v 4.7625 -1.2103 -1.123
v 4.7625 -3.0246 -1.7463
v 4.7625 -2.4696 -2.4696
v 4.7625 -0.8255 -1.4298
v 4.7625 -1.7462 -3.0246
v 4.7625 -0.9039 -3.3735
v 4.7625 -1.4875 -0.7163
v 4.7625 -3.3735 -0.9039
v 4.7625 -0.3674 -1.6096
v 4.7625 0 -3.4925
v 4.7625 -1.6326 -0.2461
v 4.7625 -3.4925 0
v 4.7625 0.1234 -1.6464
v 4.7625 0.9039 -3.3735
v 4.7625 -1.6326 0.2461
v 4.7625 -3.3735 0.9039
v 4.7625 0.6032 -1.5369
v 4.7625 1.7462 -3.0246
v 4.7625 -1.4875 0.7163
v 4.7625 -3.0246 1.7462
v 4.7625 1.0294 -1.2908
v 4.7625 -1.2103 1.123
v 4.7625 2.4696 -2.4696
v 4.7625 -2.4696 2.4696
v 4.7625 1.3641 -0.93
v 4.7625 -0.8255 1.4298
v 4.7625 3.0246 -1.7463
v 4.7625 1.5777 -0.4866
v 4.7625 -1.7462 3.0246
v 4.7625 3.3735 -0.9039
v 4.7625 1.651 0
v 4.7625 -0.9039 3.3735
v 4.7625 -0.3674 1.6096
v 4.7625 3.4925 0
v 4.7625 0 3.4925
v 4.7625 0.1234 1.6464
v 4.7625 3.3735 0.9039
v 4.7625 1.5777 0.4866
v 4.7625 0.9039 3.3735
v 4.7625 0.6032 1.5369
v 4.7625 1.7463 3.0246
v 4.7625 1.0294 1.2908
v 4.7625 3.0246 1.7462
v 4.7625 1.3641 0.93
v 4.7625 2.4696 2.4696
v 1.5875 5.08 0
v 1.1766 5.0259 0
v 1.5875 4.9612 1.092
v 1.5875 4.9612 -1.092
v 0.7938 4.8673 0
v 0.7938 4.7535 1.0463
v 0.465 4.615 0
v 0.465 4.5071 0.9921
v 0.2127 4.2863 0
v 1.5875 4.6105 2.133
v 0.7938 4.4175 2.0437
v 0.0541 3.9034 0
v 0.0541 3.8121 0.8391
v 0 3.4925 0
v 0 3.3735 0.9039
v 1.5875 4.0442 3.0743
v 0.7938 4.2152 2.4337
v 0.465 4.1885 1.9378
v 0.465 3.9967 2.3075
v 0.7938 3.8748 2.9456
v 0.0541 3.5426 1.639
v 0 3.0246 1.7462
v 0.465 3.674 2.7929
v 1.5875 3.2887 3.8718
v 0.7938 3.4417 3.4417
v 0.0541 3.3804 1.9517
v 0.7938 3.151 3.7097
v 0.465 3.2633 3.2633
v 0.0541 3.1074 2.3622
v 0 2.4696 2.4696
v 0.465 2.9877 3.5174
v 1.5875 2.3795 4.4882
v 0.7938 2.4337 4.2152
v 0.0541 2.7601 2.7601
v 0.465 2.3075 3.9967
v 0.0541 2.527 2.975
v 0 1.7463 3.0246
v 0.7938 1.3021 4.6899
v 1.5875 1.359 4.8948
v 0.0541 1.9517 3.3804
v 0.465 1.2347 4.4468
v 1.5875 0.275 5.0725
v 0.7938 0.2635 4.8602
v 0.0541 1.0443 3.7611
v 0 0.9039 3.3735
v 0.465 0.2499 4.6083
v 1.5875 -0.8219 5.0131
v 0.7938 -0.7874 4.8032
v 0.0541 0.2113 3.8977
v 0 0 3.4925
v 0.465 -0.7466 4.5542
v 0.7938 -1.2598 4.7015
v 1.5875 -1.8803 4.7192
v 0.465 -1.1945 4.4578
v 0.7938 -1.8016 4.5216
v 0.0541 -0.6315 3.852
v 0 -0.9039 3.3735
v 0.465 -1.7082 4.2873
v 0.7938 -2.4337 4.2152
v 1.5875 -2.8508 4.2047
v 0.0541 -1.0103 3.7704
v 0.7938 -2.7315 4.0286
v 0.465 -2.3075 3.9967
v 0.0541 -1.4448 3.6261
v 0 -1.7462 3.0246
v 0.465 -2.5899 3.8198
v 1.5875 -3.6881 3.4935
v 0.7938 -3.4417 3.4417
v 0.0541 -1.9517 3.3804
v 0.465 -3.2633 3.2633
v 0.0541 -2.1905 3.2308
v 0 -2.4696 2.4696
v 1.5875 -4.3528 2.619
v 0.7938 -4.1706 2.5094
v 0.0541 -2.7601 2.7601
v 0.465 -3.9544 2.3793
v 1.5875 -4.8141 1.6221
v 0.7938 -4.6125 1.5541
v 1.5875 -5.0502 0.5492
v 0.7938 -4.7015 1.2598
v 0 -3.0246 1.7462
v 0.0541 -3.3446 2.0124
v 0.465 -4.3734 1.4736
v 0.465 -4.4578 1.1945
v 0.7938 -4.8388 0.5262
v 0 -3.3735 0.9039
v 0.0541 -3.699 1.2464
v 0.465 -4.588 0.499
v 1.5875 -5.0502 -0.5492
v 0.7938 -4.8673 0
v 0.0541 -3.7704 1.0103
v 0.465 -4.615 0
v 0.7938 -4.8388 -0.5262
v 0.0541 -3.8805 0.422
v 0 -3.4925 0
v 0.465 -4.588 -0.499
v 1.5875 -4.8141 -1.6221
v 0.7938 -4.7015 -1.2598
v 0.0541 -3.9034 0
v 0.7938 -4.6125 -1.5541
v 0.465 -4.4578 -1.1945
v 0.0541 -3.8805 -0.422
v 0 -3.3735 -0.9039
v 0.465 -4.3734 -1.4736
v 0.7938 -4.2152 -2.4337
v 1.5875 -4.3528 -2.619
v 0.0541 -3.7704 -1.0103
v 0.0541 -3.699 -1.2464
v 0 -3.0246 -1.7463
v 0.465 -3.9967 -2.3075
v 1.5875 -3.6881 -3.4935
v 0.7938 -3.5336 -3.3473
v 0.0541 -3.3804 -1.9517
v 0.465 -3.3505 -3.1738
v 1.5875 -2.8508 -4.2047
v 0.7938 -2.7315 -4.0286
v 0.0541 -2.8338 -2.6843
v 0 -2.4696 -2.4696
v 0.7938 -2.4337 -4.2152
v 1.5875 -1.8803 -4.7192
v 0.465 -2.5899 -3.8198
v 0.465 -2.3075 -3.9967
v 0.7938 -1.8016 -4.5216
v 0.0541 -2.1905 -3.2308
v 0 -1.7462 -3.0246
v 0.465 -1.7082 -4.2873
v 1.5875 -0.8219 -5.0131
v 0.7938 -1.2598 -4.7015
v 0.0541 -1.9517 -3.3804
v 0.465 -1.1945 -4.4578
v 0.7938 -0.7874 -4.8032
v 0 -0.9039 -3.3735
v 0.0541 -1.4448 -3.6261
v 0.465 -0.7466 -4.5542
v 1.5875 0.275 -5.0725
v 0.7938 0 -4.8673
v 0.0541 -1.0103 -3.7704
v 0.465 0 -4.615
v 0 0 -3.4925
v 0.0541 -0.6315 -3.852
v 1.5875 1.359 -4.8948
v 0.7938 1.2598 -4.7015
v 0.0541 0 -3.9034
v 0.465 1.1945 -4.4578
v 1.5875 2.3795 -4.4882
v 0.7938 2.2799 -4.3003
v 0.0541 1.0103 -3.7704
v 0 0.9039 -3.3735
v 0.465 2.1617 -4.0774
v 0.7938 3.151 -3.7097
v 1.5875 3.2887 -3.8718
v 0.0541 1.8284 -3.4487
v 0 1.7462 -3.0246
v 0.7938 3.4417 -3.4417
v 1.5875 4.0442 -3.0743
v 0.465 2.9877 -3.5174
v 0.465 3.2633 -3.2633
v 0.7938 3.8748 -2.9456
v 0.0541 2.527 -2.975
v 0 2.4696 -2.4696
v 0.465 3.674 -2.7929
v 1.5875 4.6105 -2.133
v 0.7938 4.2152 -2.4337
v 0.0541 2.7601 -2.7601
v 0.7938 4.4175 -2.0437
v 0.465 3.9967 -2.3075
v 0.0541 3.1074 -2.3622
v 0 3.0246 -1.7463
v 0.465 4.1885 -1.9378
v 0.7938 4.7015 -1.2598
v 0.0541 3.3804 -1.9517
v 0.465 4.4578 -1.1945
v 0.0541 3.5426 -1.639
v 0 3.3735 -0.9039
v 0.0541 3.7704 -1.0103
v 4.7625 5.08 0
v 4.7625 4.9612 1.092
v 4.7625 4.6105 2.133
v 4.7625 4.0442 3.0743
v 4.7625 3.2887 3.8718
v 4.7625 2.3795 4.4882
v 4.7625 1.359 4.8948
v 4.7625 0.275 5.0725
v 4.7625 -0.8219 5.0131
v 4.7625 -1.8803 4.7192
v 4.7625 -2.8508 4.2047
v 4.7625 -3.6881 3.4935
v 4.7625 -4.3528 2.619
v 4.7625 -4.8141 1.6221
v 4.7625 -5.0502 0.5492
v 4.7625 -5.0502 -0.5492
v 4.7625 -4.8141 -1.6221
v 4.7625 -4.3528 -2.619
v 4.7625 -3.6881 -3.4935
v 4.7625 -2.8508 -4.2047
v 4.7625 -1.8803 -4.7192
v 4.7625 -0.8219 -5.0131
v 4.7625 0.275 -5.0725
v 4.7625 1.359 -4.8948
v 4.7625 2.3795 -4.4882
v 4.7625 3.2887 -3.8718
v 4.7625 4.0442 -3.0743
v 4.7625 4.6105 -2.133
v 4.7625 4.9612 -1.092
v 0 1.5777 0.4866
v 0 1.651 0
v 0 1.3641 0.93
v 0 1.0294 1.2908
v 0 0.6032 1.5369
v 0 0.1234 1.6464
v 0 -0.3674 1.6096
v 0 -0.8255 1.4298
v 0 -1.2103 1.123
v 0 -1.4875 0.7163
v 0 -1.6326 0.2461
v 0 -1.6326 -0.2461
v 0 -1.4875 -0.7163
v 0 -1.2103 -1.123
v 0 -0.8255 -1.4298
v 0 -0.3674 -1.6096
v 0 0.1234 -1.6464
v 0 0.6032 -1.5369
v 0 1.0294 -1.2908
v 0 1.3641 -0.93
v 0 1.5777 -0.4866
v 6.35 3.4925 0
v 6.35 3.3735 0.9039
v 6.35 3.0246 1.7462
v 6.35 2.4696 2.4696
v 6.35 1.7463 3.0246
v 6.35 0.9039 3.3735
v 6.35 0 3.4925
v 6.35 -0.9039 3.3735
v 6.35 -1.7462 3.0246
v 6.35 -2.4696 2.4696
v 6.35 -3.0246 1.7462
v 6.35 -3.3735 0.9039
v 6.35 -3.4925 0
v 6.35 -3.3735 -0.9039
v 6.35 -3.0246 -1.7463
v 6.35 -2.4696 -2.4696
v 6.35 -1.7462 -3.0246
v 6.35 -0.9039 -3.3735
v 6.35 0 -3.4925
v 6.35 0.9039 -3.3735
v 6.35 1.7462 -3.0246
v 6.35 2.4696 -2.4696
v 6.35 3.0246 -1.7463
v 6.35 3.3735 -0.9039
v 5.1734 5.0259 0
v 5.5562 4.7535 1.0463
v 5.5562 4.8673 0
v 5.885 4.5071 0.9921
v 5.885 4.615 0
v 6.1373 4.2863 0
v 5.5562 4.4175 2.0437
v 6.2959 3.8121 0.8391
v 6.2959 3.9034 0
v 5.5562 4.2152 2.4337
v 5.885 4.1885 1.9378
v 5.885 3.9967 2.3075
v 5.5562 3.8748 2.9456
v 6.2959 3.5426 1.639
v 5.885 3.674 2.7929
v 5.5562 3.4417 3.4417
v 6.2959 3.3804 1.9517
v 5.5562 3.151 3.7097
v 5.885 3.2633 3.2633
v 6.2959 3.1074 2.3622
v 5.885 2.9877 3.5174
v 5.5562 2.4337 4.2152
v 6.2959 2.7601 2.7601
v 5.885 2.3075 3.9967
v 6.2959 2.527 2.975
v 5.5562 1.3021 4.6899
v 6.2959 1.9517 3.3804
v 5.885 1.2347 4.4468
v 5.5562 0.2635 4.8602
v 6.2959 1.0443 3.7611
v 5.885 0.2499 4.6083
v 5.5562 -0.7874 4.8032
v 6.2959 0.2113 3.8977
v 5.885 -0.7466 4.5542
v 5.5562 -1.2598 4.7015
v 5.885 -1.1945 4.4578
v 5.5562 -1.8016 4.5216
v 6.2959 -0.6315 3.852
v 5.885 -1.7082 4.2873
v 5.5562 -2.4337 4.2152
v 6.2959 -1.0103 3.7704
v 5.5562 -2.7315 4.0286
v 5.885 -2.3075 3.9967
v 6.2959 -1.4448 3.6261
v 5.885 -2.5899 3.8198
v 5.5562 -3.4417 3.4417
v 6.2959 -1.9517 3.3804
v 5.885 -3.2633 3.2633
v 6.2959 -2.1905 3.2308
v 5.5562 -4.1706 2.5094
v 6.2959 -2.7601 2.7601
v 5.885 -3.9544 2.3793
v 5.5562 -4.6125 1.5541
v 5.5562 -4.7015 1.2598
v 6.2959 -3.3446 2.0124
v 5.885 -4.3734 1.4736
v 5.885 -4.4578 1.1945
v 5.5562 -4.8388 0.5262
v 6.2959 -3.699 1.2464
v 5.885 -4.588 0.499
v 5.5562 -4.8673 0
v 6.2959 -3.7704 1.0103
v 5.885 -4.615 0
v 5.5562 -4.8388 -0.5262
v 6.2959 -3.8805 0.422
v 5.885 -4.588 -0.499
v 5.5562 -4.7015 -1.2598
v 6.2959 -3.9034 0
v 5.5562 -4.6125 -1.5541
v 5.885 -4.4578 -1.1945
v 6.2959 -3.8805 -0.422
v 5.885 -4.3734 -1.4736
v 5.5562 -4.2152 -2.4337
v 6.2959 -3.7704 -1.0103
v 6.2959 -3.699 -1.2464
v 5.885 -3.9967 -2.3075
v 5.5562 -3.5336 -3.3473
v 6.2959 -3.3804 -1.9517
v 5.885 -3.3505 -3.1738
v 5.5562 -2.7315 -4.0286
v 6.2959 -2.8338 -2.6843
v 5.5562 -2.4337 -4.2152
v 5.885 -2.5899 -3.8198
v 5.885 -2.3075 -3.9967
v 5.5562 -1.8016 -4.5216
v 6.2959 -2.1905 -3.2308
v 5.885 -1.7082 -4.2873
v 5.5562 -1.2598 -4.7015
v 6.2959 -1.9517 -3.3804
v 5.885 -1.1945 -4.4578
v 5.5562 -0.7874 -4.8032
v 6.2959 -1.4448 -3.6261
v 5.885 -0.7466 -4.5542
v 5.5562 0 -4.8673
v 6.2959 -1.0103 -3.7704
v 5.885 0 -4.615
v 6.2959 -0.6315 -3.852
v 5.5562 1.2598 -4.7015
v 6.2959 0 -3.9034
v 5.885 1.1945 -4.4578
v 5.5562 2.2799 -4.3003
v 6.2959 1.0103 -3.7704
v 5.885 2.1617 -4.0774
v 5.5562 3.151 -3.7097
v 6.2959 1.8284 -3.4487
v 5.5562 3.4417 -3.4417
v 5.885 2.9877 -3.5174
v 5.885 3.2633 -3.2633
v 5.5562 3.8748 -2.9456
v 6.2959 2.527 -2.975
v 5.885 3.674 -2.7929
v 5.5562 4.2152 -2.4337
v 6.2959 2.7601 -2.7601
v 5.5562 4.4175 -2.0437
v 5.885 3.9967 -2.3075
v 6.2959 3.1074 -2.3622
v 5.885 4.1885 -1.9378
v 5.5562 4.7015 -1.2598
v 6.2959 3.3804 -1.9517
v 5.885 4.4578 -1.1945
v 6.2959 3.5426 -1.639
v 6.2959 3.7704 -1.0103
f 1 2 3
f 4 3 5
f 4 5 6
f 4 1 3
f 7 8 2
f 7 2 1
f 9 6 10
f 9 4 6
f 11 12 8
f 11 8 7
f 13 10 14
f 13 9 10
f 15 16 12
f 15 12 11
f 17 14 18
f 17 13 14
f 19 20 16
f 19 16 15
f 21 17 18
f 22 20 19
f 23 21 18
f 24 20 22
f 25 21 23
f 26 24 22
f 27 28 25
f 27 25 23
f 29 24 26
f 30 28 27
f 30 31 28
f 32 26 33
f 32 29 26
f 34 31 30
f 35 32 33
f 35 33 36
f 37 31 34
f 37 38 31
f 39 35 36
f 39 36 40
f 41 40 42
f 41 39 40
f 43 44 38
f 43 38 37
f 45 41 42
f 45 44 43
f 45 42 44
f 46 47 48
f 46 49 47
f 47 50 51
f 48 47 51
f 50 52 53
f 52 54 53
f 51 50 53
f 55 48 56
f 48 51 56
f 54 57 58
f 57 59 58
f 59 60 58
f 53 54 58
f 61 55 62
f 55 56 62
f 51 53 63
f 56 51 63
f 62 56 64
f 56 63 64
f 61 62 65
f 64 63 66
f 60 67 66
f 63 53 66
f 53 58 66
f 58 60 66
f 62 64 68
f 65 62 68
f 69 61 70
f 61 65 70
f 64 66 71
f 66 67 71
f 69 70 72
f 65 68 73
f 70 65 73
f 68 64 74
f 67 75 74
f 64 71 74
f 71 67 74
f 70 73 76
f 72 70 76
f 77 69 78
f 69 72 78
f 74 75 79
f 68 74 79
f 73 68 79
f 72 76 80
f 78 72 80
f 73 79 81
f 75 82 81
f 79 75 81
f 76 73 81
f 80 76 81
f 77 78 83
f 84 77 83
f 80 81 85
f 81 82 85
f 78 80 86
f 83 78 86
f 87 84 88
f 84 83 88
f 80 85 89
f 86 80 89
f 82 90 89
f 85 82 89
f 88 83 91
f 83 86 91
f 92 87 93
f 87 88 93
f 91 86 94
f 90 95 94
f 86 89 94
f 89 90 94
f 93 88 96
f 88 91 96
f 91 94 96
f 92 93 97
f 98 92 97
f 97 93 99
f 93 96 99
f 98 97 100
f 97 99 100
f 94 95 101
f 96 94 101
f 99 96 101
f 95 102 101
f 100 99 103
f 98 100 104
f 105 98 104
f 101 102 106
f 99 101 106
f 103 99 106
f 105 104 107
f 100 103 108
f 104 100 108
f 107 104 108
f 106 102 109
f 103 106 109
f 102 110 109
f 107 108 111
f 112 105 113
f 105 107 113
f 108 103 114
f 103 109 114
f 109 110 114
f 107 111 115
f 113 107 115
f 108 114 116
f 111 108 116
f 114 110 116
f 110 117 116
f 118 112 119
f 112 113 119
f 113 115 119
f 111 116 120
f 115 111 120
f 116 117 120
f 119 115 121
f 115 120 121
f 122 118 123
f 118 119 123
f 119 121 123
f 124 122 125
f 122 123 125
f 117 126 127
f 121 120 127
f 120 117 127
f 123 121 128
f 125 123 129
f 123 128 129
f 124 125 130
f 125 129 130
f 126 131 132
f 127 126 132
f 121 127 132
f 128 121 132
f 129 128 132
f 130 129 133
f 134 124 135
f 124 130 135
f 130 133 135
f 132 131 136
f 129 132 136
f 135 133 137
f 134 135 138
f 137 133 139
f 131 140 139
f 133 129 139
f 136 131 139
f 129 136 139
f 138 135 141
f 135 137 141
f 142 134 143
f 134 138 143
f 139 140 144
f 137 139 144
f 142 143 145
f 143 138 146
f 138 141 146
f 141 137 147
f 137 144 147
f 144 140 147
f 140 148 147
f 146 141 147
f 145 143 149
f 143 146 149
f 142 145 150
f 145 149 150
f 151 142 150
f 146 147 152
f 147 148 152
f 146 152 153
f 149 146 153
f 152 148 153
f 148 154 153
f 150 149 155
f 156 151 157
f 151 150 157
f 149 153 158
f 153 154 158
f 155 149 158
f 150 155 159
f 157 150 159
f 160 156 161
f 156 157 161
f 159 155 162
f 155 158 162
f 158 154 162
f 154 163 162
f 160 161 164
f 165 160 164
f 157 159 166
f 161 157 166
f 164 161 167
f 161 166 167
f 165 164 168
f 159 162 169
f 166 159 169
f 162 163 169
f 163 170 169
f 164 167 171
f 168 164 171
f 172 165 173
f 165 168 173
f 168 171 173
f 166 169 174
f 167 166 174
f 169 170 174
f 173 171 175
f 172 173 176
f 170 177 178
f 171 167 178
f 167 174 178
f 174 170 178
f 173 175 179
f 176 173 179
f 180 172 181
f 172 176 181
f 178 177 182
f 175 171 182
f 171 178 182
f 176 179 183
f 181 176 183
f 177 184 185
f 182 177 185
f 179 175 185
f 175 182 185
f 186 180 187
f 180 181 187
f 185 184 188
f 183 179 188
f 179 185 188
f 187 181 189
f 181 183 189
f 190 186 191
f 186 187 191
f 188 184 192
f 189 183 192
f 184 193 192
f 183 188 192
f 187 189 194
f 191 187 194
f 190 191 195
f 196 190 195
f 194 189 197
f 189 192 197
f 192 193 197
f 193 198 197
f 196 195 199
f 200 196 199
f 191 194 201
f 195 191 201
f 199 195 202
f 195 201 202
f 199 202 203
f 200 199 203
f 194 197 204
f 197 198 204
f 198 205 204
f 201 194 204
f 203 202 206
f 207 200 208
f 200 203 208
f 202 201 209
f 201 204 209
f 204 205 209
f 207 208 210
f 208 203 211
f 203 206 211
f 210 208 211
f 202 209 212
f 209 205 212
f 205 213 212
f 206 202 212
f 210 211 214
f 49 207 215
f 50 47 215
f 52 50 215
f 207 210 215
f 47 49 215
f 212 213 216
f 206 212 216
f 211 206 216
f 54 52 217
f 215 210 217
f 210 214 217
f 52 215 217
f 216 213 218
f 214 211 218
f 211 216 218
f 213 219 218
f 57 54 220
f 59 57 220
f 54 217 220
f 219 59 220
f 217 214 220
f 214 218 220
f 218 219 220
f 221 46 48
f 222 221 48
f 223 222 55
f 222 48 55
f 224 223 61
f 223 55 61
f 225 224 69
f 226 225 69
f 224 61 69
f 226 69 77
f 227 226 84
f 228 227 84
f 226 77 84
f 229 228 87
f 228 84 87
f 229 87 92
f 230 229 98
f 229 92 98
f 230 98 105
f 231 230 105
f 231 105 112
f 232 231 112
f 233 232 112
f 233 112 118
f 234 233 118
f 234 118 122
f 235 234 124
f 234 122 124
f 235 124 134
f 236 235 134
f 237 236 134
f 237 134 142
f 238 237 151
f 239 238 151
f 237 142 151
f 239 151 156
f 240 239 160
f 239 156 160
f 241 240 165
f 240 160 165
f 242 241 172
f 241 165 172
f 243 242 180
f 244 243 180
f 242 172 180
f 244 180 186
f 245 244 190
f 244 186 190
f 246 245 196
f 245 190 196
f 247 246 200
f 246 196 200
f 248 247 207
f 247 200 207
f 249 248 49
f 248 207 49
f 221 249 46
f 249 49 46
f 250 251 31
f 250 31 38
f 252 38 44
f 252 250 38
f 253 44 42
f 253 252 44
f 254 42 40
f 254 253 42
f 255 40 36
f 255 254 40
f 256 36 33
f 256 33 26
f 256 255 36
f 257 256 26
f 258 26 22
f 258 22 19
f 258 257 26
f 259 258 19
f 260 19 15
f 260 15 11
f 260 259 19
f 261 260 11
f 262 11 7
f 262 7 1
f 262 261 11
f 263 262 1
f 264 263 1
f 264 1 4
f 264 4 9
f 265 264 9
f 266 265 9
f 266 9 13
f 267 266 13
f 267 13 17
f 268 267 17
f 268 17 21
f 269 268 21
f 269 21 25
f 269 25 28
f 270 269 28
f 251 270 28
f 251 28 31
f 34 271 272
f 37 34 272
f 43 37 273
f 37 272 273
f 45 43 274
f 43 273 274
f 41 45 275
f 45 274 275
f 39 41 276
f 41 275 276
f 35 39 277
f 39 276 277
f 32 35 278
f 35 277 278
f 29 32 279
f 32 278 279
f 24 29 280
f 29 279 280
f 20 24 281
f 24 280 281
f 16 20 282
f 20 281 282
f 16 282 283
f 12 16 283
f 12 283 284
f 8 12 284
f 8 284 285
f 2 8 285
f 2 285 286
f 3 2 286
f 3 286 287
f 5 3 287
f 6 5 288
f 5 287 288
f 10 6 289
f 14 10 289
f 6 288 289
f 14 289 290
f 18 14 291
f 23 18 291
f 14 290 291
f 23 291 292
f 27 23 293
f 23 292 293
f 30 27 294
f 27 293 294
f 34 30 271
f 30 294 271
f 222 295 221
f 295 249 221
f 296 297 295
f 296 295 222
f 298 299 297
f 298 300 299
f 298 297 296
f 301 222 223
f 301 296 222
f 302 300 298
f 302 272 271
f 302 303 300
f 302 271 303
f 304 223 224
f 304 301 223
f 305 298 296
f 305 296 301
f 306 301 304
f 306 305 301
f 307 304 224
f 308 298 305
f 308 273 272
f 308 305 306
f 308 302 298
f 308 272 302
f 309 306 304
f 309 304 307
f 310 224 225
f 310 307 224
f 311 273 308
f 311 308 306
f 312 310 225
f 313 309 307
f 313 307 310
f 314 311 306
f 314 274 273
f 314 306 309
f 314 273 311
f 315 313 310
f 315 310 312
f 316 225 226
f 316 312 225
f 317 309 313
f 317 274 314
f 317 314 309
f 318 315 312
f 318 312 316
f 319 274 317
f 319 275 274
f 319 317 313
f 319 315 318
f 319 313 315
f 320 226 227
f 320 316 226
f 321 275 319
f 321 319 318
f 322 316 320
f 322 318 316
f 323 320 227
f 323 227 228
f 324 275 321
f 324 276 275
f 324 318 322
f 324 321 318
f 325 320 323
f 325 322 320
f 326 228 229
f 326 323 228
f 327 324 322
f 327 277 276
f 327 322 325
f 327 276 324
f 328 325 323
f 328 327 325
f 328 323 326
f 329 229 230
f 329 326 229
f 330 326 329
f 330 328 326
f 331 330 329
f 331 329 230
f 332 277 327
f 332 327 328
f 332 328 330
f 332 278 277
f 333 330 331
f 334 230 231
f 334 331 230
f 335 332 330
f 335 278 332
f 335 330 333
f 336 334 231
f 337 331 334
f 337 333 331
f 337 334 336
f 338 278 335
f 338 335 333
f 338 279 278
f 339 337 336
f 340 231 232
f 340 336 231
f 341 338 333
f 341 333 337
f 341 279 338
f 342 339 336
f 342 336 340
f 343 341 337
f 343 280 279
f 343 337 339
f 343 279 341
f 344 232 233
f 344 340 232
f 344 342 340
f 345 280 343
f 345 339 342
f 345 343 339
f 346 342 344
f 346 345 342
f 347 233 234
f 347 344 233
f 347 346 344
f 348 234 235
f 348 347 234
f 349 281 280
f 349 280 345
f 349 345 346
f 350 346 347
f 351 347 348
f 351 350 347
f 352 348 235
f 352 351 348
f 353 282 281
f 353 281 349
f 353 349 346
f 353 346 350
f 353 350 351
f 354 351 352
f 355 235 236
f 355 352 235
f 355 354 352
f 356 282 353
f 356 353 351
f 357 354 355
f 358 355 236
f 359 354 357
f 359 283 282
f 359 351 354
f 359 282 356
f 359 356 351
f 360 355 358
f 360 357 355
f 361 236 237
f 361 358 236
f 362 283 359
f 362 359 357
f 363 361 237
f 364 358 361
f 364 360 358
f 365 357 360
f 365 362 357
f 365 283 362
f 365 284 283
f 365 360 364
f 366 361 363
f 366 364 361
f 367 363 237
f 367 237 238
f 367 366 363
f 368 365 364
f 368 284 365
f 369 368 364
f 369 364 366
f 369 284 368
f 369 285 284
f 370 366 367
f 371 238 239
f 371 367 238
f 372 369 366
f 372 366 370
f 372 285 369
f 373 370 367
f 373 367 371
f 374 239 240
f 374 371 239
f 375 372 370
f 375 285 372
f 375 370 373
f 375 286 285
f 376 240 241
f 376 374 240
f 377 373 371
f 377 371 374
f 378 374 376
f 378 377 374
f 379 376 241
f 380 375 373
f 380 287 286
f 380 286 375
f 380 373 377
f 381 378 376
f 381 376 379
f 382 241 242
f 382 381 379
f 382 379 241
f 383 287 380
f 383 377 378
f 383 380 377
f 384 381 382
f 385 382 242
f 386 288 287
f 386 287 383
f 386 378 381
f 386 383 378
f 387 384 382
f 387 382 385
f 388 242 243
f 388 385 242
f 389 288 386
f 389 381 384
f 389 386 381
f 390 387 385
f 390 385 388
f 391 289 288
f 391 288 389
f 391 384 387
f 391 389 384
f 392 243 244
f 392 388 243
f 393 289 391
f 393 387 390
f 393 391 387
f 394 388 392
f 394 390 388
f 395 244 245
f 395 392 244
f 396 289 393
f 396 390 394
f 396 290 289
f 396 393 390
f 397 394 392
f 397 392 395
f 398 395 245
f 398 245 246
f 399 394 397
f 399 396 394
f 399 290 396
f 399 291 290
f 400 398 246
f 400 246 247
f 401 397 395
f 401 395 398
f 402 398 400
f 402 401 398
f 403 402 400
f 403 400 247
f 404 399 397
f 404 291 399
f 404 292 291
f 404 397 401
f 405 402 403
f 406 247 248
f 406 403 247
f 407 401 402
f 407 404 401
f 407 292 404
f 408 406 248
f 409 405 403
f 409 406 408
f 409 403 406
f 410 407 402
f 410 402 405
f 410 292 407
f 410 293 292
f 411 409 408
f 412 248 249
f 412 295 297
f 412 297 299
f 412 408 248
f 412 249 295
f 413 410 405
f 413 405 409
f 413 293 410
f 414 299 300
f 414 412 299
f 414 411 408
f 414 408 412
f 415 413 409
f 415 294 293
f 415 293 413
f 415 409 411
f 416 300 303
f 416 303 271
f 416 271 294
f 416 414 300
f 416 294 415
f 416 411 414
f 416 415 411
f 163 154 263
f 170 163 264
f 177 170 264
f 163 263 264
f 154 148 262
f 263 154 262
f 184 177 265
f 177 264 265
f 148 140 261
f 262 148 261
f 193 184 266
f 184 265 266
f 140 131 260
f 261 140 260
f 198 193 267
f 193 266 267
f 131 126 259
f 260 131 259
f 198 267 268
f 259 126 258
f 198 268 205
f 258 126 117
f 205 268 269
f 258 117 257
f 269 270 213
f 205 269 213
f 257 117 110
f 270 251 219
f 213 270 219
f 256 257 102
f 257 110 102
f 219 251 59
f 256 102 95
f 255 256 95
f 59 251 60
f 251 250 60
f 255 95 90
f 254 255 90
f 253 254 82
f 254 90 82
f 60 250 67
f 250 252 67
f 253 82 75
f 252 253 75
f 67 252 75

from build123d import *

# Parameters (mm, degrees)
F0_R     = 5.08
F0_R_2   = 1.651
F1_DEPTH = 6.35
F2_R     = 1.5875
F3_R     = 3.4925
F3_R_2   = 1.651
F4_DEPTH = 1.5875


with BuildPart() as f1:
    # F0 (on Right) → F1 (new body)
    with BuildSketch(Plane.YZ):
        Circle(F0_R)
        Circle(F0_R_2, mode=Mode.SUBTRACT)
    extrude(amount=F1_DEPTH)

    # F2
    f2_edges = [f1.edges().sort_by_distance(p)[0] for p in [
        (6.35, -5.08, 0),
        (0, -5.08, 0),
    ]]
    fillet(f2_edges, radius=F2_R)

    # F3 (on face) → F4 (cut)
    with BuildSketch(Plane.YZ.offset(6.35)):
        Circle(F3_R)
        Circle(F3_R_2, mode=Mode.SUBTRACT)
    extrude(amount=-F4_DEPTH, mode=Mode.SUBTRACT)


solid = f1.part
